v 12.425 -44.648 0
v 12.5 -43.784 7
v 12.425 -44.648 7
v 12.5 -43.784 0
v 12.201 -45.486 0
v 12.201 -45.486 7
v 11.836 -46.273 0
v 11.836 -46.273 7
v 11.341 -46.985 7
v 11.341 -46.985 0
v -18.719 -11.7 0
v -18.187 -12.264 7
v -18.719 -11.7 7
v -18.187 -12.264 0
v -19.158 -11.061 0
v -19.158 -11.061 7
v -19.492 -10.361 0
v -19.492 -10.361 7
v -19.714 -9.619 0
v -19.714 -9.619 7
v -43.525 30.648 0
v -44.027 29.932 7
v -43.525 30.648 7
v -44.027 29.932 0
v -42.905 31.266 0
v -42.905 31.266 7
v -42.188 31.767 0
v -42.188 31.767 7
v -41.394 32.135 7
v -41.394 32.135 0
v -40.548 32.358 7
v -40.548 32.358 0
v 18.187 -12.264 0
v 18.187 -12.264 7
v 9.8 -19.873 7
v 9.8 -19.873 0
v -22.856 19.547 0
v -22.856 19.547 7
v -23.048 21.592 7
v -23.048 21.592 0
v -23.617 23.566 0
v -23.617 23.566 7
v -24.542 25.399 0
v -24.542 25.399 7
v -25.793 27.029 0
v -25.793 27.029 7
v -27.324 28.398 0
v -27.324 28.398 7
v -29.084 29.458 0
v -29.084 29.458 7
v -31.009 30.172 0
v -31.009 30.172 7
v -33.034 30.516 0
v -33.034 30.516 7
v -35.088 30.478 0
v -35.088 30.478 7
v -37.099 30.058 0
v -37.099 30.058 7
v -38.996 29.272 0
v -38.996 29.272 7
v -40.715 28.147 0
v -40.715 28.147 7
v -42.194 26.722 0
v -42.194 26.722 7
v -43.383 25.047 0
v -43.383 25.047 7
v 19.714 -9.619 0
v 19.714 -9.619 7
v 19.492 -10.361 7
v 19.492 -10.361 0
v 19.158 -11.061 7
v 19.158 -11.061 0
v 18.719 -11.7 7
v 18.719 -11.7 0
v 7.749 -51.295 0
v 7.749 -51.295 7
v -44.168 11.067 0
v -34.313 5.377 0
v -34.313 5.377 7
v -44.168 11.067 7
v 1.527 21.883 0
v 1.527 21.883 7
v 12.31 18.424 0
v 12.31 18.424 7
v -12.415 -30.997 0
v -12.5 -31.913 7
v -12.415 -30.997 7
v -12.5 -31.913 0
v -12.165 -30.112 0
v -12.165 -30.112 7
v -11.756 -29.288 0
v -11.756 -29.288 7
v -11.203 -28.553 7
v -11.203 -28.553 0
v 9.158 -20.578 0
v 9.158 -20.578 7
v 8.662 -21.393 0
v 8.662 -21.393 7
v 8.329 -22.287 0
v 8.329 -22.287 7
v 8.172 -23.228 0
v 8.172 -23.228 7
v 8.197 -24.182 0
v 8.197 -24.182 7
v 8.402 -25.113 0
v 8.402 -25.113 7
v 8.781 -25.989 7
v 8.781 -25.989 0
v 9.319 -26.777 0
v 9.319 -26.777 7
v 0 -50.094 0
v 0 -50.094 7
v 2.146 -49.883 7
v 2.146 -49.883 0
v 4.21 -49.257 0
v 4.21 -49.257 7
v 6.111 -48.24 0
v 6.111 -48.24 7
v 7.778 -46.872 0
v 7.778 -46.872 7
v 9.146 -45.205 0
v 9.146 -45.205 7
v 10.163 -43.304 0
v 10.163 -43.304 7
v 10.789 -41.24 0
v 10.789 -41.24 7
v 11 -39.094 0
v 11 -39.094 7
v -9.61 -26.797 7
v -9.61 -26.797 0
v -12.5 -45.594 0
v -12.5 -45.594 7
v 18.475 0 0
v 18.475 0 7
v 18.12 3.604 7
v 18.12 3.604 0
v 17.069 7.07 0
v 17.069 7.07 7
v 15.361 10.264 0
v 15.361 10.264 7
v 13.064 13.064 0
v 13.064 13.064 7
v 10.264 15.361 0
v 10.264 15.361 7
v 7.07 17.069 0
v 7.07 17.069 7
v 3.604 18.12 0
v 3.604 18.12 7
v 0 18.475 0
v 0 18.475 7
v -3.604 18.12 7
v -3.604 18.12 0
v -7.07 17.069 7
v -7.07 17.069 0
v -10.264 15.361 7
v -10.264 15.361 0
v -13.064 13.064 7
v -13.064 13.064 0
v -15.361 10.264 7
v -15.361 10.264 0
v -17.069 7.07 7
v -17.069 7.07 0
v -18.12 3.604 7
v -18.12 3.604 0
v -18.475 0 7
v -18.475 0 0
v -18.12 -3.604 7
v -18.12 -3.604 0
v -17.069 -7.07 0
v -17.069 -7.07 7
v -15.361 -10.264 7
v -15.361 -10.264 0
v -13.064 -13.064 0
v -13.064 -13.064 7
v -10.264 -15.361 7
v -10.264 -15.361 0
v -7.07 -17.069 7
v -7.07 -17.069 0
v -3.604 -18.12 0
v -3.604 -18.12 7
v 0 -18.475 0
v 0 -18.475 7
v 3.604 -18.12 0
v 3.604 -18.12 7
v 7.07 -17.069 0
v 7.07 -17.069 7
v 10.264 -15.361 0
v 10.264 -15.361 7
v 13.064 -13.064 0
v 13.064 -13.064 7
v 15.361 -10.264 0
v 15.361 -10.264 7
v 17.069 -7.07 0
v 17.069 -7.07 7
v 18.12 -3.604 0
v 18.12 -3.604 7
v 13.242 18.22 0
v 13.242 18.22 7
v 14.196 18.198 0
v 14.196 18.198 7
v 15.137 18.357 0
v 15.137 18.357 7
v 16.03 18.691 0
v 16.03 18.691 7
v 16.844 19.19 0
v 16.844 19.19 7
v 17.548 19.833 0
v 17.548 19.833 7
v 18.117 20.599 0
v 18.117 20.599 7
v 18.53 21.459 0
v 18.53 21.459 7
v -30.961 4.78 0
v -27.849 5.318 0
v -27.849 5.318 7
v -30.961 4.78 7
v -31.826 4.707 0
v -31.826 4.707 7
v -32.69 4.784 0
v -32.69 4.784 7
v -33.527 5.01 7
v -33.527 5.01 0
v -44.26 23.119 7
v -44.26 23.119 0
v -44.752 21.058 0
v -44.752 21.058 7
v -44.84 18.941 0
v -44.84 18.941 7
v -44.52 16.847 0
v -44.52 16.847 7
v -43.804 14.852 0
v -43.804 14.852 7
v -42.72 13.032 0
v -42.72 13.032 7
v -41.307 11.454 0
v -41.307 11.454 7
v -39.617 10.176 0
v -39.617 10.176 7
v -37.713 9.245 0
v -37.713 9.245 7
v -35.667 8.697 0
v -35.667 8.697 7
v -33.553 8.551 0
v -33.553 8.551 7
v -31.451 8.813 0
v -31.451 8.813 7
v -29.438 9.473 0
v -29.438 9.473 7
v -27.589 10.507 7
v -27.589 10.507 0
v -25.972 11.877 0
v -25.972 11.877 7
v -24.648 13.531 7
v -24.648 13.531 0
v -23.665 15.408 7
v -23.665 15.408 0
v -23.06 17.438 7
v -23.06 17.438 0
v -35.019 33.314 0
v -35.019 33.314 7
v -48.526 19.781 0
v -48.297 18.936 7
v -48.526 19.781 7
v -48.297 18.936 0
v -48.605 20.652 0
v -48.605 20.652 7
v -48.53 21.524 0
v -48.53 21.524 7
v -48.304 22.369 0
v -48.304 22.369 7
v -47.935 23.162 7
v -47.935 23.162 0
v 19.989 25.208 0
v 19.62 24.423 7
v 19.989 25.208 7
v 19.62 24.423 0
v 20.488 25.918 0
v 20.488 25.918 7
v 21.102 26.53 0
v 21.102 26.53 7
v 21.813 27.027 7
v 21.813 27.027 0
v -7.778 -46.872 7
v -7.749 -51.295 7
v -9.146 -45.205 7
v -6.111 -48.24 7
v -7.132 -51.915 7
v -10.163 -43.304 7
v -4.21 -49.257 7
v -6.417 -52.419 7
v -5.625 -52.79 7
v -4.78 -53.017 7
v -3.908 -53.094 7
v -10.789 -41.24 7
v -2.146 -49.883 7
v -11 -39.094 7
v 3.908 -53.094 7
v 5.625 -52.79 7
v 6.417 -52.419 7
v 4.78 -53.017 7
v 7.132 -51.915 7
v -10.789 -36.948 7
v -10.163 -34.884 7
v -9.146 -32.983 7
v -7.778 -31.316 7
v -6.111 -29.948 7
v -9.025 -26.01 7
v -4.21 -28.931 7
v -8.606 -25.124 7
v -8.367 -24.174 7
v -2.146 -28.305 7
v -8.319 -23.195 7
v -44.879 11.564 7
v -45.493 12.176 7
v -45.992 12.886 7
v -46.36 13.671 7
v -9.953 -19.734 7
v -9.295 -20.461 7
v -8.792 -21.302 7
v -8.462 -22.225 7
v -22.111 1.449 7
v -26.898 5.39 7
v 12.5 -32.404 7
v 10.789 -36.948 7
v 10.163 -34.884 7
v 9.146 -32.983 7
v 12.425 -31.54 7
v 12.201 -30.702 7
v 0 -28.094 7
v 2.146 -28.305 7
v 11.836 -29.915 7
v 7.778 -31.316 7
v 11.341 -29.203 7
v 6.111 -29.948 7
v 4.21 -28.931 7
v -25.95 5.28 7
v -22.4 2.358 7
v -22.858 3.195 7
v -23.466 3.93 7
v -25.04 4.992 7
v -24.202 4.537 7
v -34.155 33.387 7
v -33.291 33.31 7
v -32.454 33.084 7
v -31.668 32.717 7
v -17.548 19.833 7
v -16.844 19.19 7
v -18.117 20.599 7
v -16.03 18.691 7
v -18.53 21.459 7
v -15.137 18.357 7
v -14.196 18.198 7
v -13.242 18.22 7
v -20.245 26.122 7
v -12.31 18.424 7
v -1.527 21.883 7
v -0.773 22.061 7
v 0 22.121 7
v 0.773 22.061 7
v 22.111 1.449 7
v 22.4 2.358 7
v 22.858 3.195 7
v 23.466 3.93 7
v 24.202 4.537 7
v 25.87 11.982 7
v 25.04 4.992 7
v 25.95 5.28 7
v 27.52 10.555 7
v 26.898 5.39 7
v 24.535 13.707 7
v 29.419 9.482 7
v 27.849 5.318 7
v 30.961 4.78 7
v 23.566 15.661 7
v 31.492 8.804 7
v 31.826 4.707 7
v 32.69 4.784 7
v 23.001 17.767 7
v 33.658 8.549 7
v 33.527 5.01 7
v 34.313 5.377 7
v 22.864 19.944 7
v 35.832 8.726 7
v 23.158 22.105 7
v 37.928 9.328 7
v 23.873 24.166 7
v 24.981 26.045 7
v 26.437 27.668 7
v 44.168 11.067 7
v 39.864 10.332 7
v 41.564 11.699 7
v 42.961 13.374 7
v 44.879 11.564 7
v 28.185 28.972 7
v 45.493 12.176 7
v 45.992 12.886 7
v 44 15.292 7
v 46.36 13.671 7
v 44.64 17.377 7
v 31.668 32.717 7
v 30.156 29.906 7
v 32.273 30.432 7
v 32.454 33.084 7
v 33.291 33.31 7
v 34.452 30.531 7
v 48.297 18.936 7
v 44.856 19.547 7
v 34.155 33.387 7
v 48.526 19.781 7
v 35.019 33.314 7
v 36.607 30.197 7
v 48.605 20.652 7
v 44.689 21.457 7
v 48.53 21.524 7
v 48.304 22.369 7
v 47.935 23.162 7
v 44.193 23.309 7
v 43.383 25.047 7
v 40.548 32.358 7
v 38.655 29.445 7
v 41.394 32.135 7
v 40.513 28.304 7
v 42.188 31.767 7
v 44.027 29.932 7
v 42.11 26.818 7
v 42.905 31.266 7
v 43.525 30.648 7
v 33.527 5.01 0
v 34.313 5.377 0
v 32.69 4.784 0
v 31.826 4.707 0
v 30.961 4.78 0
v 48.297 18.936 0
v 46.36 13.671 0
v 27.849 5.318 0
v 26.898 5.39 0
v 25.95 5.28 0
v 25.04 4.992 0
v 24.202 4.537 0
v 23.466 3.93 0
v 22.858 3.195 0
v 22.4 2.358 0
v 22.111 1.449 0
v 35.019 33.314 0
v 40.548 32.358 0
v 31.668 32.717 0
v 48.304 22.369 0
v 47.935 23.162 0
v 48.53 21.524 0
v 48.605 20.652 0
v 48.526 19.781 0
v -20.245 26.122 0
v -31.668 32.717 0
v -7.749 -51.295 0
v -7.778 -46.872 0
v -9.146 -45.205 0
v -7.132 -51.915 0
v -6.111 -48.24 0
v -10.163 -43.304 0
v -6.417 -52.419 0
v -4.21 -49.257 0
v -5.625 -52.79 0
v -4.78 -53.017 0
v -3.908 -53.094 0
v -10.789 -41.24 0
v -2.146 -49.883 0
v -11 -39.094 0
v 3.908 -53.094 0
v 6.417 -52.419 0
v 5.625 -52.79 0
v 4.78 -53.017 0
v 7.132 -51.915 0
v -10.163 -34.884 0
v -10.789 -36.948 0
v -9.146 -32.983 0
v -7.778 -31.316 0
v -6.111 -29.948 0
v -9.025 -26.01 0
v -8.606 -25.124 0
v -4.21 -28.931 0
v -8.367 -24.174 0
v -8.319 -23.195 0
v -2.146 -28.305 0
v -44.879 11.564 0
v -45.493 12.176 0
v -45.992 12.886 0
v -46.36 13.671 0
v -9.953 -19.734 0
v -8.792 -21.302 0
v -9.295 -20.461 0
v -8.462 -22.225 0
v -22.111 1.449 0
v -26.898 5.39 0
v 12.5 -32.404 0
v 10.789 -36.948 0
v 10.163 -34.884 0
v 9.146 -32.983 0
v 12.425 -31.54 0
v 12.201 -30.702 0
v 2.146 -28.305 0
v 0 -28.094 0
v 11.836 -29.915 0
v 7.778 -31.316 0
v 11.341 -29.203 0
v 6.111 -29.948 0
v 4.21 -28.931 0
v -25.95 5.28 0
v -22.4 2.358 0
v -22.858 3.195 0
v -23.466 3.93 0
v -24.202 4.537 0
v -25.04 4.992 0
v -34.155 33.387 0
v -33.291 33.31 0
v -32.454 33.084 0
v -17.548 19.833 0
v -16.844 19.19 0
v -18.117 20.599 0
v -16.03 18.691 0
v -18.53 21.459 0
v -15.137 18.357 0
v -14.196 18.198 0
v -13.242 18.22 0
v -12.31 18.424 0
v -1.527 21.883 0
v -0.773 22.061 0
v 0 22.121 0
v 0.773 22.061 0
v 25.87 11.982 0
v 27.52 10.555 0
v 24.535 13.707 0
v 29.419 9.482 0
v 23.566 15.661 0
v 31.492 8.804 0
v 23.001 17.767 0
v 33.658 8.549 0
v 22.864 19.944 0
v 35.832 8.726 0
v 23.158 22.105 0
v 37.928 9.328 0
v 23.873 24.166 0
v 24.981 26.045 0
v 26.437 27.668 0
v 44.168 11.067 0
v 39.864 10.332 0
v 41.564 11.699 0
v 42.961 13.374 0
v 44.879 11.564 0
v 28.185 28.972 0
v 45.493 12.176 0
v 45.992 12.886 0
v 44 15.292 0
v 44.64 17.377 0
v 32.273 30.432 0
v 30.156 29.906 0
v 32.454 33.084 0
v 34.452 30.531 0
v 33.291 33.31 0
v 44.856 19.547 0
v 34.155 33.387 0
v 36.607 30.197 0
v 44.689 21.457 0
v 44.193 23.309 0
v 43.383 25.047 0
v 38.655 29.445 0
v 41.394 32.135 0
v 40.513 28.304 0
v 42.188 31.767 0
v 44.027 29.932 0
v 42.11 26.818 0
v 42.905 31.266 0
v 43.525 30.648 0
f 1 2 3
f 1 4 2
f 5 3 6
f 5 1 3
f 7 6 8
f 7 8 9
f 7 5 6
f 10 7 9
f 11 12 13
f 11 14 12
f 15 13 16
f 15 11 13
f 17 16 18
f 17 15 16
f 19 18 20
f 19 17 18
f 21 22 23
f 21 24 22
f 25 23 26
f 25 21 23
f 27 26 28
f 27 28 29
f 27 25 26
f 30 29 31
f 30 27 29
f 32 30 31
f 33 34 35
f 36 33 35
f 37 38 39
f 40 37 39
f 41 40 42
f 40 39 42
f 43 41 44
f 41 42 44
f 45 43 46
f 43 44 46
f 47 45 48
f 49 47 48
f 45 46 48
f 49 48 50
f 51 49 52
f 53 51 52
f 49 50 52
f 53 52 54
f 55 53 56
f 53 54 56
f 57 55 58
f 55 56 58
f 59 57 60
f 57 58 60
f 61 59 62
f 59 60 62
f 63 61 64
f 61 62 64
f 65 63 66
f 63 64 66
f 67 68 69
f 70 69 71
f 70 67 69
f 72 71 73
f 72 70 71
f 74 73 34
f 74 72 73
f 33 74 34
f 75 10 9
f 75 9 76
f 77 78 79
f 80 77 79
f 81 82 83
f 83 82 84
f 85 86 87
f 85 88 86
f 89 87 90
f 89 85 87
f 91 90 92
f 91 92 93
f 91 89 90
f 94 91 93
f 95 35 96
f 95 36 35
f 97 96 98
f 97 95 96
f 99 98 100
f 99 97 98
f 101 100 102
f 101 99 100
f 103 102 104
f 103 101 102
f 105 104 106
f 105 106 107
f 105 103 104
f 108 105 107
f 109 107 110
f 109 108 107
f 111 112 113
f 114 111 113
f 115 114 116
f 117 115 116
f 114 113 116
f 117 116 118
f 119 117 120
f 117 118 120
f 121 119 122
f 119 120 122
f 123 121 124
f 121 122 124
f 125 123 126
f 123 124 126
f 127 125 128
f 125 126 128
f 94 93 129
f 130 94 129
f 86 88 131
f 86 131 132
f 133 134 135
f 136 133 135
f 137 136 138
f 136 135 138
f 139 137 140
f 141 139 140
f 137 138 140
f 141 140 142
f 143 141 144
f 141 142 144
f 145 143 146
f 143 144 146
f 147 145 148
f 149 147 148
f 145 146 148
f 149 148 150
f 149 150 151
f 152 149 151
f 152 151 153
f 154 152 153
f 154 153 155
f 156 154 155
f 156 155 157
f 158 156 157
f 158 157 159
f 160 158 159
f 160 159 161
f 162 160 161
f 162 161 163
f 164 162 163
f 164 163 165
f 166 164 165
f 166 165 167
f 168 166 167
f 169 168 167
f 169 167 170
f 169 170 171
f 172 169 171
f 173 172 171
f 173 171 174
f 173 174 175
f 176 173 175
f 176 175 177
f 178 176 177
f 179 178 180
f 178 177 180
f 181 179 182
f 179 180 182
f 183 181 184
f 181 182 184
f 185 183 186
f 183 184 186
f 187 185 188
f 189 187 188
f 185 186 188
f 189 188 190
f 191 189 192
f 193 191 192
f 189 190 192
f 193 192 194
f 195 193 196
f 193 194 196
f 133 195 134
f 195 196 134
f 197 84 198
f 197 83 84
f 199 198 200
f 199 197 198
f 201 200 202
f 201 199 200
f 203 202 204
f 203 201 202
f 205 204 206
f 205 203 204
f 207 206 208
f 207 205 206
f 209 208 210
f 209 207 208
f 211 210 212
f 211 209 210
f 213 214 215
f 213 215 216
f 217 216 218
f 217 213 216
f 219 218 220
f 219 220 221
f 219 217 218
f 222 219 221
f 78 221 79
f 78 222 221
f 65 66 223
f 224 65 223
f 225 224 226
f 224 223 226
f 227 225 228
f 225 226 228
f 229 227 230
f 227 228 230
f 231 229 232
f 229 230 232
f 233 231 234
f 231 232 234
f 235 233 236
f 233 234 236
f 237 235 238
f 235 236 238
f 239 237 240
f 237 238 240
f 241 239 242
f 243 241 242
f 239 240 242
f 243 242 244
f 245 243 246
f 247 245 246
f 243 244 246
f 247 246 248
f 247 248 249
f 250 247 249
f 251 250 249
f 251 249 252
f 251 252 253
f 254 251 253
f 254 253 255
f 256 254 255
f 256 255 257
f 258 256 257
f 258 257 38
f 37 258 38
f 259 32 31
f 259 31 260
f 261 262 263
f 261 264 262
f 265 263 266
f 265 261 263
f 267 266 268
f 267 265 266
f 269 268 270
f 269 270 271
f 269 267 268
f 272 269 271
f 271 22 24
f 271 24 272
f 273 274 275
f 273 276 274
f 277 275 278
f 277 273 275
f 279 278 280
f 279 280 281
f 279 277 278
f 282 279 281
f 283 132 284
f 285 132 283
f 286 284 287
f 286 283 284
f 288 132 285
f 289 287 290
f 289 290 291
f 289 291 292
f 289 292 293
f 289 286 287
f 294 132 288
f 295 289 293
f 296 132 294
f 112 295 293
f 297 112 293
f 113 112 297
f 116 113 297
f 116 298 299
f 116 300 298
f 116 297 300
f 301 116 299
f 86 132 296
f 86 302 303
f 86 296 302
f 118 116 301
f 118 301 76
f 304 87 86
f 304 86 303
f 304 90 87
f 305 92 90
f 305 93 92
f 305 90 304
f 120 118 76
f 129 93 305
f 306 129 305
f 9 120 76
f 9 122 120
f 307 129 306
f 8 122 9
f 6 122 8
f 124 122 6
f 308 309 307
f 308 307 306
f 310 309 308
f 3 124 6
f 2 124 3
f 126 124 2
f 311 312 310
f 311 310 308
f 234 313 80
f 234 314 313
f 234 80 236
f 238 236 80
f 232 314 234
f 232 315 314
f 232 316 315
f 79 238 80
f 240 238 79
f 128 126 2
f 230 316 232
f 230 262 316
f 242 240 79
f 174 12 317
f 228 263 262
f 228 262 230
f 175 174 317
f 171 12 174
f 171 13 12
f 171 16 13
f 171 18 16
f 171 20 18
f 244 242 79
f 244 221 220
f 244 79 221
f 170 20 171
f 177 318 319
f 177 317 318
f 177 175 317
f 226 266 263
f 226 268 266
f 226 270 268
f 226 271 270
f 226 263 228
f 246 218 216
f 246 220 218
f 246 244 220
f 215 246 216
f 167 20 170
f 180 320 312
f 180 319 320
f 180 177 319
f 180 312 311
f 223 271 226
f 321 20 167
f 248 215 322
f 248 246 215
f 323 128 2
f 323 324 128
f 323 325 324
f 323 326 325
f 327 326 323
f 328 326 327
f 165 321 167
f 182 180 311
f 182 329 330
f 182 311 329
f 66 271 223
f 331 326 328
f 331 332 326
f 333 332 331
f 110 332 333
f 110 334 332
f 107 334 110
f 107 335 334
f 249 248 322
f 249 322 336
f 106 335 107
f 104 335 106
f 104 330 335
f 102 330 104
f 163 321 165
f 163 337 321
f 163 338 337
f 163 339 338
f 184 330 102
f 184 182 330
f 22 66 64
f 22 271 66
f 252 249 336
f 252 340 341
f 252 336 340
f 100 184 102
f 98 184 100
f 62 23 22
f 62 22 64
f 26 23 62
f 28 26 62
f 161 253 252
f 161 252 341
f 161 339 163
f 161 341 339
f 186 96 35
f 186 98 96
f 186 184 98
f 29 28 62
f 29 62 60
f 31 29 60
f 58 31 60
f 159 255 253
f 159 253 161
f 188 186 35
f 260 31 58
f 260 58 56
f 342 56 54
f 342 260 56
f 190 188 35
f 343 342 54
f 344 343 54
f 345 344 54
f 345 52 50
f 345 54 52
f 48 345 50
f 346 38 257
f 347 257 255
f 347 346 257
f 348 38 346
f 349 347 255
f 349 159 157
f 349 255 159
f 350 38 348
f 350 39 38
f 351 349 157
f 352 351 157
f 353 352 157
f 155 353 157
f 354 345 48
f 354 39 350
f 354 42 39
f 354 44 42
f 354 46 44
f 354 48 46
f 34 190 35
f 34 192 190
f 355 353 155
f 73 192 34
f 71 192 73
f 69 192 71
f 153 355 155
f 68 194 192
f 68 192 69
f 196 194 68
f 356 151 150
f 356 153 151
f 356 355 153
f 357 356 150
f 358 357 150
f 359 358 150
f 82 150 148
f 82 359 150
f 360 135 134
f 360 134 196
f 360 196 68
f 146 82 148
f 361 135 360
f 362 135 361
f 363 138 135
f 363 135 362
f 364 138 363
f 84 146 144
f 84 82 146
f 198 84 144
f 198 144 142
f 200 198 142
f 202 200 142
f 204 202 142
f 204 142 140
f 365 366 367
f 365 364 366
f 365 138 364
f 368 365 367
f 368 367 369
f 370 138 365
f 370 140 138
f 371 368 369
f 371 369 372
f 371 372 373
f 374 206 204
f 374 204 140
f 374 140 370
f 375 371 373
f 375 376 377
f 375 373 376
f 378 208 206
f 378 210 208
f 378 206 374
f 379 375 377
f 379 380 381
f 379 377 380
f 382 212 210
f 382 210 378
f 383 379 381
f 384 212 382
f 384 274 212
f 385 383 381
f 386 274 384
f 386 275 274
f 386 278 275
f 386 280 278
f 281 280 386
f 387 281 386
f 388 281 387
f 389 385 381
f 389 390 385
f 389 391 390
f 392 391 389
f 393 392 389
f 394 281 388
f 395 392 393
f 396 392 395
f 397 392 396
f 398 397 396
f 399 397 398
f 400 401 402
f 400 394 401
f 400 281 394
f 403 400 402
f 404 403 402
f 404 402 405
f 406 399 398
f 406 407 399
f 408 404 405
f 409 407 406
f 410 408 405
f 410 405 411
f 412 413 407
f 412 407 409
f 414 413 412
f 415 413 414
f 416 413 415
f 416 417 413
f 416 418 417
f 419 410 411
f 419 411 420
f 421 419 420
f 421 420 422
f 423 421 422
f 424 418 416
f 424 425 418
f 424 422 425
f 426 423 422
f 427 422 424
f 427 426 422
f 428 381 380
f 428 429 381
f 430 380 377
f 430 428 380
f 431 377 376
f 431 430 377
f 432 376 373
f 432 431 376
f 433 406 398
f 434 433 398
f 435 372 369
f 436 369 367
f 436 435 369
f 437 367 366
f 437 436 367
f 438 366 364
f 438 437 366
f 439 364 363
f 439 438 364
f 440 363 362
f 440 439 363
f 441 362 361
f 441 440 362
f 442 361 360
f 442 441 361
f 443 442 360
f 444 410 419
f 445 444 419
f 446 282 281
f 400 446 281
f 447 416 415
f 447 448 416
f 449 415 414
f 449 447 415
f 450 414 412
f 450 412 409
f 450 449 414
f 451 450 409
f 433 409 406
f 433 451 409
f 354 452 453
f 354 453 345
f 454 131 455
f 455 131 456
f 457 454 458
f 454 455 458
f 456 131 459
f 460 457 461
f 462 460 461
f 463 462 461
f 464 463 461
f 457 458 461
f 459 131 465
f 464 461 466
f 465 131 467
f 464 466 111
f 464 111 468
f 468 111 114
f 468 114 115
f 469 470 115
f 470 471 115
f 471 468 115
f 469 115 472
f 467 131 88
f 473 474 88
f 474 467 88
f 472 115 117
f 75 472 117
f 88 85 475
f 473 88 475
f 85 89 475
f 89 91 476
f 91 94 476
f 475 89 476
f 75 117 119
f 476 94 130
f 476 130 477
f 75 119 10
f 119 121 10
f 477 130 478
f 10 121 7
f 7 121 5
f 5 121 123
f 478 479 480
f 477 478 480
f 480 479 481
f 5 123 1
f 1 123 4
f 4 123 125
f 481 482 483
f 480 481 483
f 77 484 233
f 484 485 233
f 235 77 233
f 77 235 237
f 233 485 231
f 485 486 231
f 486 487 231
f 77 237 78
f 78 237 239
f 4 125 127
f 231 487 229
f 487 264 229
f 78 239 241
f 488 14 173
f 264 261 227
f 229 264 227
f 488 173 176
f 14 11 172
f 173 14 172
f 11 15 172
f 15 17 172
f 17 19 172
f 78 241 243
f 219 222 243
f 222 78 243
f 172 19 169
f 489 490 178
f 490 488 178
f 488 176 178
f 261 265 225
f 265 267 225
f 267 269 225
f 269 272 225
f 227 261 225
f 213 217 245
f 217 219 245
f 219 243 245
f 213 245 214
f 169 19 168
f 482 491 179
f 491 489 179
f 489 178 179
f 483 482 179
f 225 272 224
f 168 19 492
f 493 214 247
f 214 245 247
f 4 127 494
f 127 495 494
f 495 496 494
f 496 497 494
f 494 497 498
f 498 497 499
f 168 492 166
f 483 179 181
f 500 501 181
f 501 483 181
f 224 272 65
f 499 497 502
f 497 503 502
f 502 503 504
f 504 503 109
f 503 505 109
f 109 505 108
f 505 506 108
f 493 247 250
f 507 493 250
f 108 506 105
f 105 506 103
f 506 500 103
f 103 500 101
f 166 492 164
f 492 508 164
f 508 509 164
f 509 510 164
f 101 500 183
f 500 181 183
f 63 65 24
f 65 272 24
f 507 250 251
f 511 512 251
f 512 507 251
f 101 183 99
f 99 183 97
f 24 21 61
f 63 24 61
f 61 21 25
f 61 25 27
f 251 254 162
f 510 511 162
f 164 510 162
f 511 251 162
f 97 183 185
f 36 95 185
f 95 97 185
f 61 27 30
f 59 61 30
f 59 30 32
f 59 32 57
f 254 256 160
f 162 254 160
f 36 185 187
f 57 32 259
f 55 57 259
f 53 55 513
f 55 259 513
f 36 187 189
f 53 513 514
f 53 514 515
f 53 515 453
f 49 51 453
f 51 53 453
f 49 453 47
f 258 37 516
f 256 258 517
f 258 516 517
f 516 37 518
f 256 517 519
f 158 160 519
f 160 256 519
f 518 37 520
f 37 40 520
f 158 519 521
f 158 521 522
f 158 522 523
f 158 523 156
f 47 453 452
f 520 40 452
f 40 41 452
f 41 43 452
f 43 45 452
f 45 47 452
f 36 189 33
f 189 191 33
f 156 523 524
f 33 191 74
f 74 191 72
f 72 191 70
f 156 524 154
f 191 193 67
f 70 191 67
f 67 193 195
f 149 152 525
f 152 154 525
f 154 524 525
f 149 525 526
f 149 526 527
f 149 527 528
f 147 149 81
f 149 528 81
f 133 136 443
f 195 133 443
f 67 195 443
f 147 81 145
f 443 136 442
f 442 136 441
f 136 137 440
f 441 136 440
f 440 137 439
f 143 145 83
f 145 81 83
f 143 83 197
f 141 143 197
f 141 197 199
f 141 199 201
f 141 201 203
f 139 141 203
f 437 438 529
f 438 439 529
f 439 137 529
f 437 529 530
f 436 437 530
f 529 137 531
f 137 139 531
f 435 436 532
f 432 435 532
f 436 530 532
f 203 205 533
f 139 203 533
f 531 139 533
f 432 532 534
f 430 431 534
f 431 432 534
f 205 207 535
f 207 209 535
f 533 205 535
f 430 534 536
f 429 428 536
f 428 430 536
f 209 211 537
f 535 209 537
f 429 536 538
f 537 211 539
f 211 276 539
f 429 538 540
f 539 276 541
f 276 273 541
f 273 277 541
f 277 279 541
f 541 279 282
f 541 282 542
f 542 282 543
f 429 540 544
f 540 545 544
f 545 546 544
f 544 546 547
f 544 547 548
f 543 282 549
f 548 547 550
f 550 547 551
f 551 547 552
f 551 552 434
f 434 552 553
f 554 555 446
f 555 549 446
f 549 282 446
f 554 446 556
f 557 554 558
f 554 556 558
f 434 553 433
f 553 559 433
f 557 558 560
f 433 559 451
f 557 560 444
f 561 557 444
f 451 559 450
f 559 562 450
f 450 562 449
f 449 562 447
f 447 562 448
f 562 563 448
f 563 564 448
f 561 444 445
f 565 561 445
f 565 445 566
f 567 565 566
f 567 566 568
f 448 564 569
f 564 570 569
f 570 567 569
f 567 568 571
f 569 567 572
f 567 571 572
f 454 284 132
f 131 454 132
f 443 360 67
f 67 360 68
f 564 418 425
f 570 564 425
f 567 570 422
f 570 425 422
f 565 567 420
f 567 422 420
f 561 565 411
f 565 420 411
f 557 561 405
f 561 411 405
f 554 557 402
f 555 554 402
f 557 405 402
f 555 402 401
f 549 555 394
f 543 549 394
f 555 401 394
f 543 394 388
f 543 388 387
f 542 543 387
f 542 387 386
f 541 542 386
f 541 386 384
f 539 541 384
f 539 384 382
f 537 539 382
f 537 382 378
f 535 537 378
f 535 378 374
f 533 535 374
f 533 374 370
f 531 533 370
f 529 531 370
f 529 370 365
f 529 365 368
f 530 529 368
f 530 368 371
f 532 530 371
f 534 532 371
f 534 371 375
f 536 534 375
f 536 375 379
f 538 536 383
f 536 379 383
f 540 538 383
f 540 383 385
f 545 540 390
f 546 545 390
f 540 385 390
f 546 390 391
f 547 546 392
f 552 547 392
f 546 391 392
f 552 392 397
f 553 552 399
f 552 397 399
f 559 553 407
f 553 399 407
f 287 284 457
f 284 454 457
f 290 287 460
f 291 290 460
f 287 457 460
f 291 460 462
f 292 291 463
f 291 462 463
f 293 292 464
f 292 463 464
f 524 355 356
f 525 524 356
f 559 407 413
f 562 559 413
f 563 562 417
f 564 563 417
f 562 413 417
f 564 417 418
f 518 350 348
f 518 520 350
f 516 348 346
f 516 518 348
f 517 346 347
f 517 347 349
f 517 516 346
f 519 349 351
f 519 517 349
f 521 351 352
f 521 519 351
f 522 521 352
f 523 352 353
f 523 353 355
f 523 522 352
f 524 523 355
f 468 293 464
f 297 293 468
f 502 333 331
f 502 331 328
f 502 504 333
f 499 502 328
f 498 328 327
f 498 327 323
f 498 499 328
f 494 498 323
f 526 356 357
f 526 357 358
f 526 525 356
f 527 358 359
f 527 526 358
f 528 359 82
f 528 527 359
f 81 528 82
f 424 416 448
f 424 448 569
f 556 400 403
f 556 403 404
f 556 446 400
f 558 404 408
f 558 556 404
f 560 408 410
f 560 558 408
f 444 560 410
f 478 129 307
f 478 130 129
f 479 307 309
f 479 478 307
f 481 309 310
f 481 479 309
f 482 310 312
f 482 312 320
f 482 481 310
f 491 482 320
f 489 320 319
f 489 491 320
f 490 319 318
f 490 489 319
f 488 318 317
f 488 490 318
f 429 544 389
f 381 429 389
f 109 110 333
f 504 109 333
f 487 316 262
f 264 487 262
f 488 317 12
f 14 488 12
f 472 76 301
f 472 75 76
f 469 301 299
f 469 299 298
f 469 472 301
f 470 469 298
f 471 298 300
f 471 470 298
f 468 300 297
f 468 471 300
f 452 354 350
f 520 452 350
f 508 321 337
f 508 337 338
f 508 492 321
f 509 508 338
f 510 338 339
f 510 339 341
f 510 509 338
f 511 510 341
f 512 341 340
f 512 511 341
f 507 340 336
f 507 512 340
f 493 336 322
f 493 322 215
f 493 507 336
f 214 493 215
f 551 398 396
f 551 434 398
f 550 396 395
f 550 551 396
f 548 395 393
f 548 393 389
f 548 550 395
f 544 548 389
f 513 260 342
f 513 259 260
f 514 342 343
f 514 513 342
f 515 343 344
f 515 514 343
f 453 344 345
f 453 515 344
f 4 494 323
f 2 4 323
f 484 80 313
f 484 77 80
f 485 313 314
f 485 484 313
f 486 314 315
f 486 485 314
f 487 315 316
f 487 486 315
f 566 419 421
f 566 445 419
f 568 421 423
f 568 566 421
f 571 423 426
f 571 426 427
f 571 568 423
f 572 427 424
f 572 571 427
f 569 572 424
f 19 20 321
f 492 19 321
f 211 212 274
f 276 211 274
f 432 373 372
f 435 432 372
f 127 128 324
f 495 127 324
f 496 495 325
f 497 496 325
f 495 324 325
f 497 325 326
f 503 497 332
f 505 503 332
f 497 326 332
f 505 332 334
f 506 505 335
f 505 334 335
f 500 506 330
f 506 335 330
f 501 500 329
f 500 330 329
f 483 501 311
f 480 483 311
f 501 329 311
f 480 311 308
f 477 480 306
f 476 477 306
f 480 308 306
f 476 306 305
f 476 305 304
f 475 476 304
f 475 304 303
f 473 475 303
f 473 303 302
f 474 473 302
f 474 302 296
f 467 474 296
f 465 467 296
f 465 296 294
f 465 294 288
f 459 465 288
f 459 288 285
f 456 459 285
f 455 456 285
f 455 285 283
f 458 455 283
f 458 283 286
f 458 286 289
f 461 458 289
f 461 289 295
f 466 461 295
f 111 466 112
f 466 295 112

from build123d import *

# Parameters (mm, degrees)
F1_DEPTH  = 7
F3_R      = 18.475
F4_DEPTH  = 25
F5_W      = 25
F5_H      = 7
F6_DEPTH  = 30
F7_W      = 25
F7_H      = 7
F8_DEPTH  = 30
F9_W      = 25
F9_H      = 7
F10_DEPTH = 30
F12_DEPTH = 25
F14_DEPTH = 25
F16_DEPTH = 25
F17_R     = 5


with BuildPart() as f1:
    # F0 (on Top) → F1 (new body)
    with BuildSketch(Plane.XY):
        Polygon((-20, 34.6410161514), (0, 23.0940107676), (0, 69.2820323028), align=None)
        Polygon((0, 23.0940107676), (20, 34.6410161514), (0, 69.2820323028), align=None)
        Polygon((0, 23.0940107676), (40, 0), (20, 34.6410161514), align=None)
        Polygon((0, 0), (40, 0), (0, 23.0940107676), align=None)
        Polygon((-40, 0), (0, 0), (0, 23.0940107676), align=None)
        Polygon((-40, 0), (0, 23.0940107676), (-20, 34.6410161514), align=None)
    extrude(amount=F1_DEPTH)


with BuildPart() as f1_1:
    # F2: moved
    add(f1.part.moved(Location((0, -23.09401, 0))))

    # F3 (on face) → F4 (cut)
    with BuildSketch(Plane.XY.offset(7)):
        Circle(F3_R)
    extrude(amount=-F4_DEPTH, mode=Mode.SUBTRACT)

    # F5 (on face) → F6 (join)
    with BuildSketch(Plane.XZ.offset(23.09401)):
        with Locations((0, 3.5)):
            Rectangle(F5_W, F5_H)
    extrude(amount=F6_DEPTH)

    # F7 (on face) → F8 (join)
    with BuildSketch(Plane(origin=(20.0000003324, 11.5470055757, 0), x_dir=(-0.5, 0.8660254038, 0), z_dir=(0.8660254038, 0.5, 0))):
        with Locations((6.647e-07, 3.5)):
            Rectangle(F7_W, F7_H)
    extrude(amount=F8_DEPTH)

    # F9 (on face) → F10 (join)
    with BuildSketch(Plane(origin=(-20.0000003324, 11.5470055757, 0), x_dir=(-0.5, -0.8660254038, 0), z_dir=(-0.8660254038, 0.5, 0))):
        with Locations((0, 3.5)):
            Rectangle(F9_W, F9_H)
    extrude(amount=F10_DEPTH)

    # F11 (on face) → F12 (cut)
    with BuildSketch(Plane.XY.offset(7)):
        Polygon((0, 46.1880223028), (-13.7500003324, 22.372323123), (13.75, 22.3723236987), align=None)
        Polygon((26.25, 0.7216886041), (12.5, -23.09401), (40, -23.09401), align=None)
        Polygon((-12.5, -23.09401), (-26.2500003324, 0.7216880284), (-40, -23.09401), align=None)
    extrude(amount=-F12_DEPTH, mode=Mode.SUBTRACT)

    # F13 (on face) → F14 (cut)
    with BuildSketch(Plane.XY.offset(7)):
        with BuildLine():
            ThreePointArc((-22.8564067929, 19.5470055757), (-31.0093972968, 30.1721896649), (-43.3826862346, 25.0470055757))
            ThreePointArc((-43.3826862346, 25.0470055757), (-36.7034162891, 8.9218214865), (-22.8564067929, 19.5470055757))
        make_face()
        with BuildLine():
            ThreePointArc((44.8564064606, 19.5470061514), (44.4815905497, 22.3940156475), (43.3826859022, 25.0470061514))
            ThreePointArc((43.3826859022, 25.0470061514), (23.2312223714, 16.6999966552), (44.8564064606, 19.5470061514))
        make_face()
        with BuildLine():
            ThreePointArc((11, -39.09401), (-7.7781745931, -31.3158354069), (0, -50.09401))
            ThreePointArc((0, -50.09401), (7.7781745931, -46.8721845931), (11, -39.09401))
        make_face()
    extrude(amount=-F14_DEPTH, mode=Mode.SUBTRACT)

    # F15 (on face) → F16 (cut)
    with BuildSketch(Plane.XY.offset(7)):
        Polygon((-20.2451908608, 26.122323123), (-16.8750003324, 16.9596643493), (-13.7500003324, 22.372323123), align=None)
        Polygon((-13.7500003324, 22.372323123), (-16.8750003324, 16.9596643493), (-1.662e-07, 22.3723234108), align=None)
        Polygon((13.75, 22.3723236987), (-1.662e-07, 22.3723234108), (16.875, 16.959664925), align=None)
        Polygon((13.75, 22.3723236987), (16.875, 16.959664925), (20.2451905284, 26.1223236987), align=None)
        Polygon((32.7451905284, 4.4716886041), (23.125, 6.1343473777), (26.25, 0.7216886041), align=None)
        Polygon((23.125, 6.1343473777), (19.375, -11.186160698), (26.25, 0.7216886041), align=None)
        Polygon((19.375, -11.186160698), (6.25, -23.09401), (12.5, -23.09401), align=None)
        Polygon((12.5, -23.09401), (6.25, -23.09401), (12.5, -30.59401), align=None)
        Polygon((-12.5, -29.9828486929), (-6.25, -23.09401), (-12.5, -23.09401), align=None)
        Polygon((-6.25, -23.09401), (-19.3750001662, -11.1861609858), (-12.5, -23.09401), align=None)
        Polygon((-23.1250003324, 6.134346802), (-26.2500003324, 0.7216880284), (-19.3750001662, -11.1861609858), align=None)
        Polygon((-32.7451908608, 4.4716880284), (-26.2500003324, 0.7216880284), (-23.1250003324, 6.134346802), align=None)
        Polygon((-52.2307624459, 15.7216880284), (-45.7355719175, 11.9716880284), (-49.1057624459, 21.134346802), align=None)
        Polygon((-42.8557624459, 31.9596643493), (-33.2355719175, 33.622323123), (-39.7307624459, 37.372323123), align=None)
        Polygon((39.7307621135, 37.3723236987), (33.2355715851, 33.6223236987), (42.8557621135, 31.959664925), align=None)
        Polygon((49.1057621135, 21.1343473777), (45.7355715851, 11.9716886041), (52.2307621135, 15.7216886041), align=None)
        Polygon((12.5, -53.09401), (12.5, -45.59401), (6.25, -53.09401), align=None)
        Polygon((-6.25, -53.09401), (-12.5, -45.59401), (-12.5, -53.09401), align=None)
    extrude(amount=-F16_DEPTH, mode=Mode.SUBTRACT)

    # F17
    f17_edges = [f1_1.edges().sort_by_distance(p)[0] for p in [
        (6.25, -53.09401, 3.5),
        (12.5, -45.59401, 3.5),
        (12.5, -30.59401, 3.5),
        (-6.25, -53.09401, 3.5),
        (23.125, 6.134347, 3.5),
        (32.745191, 4.471689, 3.5),
        (45.735572, 11.971689, 3.5),
        (6.25, -23.09401, 3.5),
        (49.105762, 21.134347, 3.5),
        (42.855762, 31.959665, 3.5),
        (33.235572, 33.622324, 3.5),
        (20.245191, 26.122324, 3.5),
        (-33.235572, 33.622323, 3.5),
        (-12.5, -29.982849, 3.5),
        (-42.855762, 31.959664, 3.5),
        (-49.105762, 21.134347, 3.5),
        (-16.875, 16.959664, 3.5),
        (-23.125, 6.134347, 3.5),
        (-32.745191, 4.471688, 3.5),
        (-45.735572, 11.971688, 3.5),
        (-6.25, -23.09401, 3.5),
        (-19.375, -11.186161, 3.5),
        (0, 22.372323, 3.5),
        (16.875, 16.959665, 3.5),
        (19.375, -11.186161, 3.5),
    ]]
    fillet(f17_edges, radius=F17_R)


solid = f1_1.part
